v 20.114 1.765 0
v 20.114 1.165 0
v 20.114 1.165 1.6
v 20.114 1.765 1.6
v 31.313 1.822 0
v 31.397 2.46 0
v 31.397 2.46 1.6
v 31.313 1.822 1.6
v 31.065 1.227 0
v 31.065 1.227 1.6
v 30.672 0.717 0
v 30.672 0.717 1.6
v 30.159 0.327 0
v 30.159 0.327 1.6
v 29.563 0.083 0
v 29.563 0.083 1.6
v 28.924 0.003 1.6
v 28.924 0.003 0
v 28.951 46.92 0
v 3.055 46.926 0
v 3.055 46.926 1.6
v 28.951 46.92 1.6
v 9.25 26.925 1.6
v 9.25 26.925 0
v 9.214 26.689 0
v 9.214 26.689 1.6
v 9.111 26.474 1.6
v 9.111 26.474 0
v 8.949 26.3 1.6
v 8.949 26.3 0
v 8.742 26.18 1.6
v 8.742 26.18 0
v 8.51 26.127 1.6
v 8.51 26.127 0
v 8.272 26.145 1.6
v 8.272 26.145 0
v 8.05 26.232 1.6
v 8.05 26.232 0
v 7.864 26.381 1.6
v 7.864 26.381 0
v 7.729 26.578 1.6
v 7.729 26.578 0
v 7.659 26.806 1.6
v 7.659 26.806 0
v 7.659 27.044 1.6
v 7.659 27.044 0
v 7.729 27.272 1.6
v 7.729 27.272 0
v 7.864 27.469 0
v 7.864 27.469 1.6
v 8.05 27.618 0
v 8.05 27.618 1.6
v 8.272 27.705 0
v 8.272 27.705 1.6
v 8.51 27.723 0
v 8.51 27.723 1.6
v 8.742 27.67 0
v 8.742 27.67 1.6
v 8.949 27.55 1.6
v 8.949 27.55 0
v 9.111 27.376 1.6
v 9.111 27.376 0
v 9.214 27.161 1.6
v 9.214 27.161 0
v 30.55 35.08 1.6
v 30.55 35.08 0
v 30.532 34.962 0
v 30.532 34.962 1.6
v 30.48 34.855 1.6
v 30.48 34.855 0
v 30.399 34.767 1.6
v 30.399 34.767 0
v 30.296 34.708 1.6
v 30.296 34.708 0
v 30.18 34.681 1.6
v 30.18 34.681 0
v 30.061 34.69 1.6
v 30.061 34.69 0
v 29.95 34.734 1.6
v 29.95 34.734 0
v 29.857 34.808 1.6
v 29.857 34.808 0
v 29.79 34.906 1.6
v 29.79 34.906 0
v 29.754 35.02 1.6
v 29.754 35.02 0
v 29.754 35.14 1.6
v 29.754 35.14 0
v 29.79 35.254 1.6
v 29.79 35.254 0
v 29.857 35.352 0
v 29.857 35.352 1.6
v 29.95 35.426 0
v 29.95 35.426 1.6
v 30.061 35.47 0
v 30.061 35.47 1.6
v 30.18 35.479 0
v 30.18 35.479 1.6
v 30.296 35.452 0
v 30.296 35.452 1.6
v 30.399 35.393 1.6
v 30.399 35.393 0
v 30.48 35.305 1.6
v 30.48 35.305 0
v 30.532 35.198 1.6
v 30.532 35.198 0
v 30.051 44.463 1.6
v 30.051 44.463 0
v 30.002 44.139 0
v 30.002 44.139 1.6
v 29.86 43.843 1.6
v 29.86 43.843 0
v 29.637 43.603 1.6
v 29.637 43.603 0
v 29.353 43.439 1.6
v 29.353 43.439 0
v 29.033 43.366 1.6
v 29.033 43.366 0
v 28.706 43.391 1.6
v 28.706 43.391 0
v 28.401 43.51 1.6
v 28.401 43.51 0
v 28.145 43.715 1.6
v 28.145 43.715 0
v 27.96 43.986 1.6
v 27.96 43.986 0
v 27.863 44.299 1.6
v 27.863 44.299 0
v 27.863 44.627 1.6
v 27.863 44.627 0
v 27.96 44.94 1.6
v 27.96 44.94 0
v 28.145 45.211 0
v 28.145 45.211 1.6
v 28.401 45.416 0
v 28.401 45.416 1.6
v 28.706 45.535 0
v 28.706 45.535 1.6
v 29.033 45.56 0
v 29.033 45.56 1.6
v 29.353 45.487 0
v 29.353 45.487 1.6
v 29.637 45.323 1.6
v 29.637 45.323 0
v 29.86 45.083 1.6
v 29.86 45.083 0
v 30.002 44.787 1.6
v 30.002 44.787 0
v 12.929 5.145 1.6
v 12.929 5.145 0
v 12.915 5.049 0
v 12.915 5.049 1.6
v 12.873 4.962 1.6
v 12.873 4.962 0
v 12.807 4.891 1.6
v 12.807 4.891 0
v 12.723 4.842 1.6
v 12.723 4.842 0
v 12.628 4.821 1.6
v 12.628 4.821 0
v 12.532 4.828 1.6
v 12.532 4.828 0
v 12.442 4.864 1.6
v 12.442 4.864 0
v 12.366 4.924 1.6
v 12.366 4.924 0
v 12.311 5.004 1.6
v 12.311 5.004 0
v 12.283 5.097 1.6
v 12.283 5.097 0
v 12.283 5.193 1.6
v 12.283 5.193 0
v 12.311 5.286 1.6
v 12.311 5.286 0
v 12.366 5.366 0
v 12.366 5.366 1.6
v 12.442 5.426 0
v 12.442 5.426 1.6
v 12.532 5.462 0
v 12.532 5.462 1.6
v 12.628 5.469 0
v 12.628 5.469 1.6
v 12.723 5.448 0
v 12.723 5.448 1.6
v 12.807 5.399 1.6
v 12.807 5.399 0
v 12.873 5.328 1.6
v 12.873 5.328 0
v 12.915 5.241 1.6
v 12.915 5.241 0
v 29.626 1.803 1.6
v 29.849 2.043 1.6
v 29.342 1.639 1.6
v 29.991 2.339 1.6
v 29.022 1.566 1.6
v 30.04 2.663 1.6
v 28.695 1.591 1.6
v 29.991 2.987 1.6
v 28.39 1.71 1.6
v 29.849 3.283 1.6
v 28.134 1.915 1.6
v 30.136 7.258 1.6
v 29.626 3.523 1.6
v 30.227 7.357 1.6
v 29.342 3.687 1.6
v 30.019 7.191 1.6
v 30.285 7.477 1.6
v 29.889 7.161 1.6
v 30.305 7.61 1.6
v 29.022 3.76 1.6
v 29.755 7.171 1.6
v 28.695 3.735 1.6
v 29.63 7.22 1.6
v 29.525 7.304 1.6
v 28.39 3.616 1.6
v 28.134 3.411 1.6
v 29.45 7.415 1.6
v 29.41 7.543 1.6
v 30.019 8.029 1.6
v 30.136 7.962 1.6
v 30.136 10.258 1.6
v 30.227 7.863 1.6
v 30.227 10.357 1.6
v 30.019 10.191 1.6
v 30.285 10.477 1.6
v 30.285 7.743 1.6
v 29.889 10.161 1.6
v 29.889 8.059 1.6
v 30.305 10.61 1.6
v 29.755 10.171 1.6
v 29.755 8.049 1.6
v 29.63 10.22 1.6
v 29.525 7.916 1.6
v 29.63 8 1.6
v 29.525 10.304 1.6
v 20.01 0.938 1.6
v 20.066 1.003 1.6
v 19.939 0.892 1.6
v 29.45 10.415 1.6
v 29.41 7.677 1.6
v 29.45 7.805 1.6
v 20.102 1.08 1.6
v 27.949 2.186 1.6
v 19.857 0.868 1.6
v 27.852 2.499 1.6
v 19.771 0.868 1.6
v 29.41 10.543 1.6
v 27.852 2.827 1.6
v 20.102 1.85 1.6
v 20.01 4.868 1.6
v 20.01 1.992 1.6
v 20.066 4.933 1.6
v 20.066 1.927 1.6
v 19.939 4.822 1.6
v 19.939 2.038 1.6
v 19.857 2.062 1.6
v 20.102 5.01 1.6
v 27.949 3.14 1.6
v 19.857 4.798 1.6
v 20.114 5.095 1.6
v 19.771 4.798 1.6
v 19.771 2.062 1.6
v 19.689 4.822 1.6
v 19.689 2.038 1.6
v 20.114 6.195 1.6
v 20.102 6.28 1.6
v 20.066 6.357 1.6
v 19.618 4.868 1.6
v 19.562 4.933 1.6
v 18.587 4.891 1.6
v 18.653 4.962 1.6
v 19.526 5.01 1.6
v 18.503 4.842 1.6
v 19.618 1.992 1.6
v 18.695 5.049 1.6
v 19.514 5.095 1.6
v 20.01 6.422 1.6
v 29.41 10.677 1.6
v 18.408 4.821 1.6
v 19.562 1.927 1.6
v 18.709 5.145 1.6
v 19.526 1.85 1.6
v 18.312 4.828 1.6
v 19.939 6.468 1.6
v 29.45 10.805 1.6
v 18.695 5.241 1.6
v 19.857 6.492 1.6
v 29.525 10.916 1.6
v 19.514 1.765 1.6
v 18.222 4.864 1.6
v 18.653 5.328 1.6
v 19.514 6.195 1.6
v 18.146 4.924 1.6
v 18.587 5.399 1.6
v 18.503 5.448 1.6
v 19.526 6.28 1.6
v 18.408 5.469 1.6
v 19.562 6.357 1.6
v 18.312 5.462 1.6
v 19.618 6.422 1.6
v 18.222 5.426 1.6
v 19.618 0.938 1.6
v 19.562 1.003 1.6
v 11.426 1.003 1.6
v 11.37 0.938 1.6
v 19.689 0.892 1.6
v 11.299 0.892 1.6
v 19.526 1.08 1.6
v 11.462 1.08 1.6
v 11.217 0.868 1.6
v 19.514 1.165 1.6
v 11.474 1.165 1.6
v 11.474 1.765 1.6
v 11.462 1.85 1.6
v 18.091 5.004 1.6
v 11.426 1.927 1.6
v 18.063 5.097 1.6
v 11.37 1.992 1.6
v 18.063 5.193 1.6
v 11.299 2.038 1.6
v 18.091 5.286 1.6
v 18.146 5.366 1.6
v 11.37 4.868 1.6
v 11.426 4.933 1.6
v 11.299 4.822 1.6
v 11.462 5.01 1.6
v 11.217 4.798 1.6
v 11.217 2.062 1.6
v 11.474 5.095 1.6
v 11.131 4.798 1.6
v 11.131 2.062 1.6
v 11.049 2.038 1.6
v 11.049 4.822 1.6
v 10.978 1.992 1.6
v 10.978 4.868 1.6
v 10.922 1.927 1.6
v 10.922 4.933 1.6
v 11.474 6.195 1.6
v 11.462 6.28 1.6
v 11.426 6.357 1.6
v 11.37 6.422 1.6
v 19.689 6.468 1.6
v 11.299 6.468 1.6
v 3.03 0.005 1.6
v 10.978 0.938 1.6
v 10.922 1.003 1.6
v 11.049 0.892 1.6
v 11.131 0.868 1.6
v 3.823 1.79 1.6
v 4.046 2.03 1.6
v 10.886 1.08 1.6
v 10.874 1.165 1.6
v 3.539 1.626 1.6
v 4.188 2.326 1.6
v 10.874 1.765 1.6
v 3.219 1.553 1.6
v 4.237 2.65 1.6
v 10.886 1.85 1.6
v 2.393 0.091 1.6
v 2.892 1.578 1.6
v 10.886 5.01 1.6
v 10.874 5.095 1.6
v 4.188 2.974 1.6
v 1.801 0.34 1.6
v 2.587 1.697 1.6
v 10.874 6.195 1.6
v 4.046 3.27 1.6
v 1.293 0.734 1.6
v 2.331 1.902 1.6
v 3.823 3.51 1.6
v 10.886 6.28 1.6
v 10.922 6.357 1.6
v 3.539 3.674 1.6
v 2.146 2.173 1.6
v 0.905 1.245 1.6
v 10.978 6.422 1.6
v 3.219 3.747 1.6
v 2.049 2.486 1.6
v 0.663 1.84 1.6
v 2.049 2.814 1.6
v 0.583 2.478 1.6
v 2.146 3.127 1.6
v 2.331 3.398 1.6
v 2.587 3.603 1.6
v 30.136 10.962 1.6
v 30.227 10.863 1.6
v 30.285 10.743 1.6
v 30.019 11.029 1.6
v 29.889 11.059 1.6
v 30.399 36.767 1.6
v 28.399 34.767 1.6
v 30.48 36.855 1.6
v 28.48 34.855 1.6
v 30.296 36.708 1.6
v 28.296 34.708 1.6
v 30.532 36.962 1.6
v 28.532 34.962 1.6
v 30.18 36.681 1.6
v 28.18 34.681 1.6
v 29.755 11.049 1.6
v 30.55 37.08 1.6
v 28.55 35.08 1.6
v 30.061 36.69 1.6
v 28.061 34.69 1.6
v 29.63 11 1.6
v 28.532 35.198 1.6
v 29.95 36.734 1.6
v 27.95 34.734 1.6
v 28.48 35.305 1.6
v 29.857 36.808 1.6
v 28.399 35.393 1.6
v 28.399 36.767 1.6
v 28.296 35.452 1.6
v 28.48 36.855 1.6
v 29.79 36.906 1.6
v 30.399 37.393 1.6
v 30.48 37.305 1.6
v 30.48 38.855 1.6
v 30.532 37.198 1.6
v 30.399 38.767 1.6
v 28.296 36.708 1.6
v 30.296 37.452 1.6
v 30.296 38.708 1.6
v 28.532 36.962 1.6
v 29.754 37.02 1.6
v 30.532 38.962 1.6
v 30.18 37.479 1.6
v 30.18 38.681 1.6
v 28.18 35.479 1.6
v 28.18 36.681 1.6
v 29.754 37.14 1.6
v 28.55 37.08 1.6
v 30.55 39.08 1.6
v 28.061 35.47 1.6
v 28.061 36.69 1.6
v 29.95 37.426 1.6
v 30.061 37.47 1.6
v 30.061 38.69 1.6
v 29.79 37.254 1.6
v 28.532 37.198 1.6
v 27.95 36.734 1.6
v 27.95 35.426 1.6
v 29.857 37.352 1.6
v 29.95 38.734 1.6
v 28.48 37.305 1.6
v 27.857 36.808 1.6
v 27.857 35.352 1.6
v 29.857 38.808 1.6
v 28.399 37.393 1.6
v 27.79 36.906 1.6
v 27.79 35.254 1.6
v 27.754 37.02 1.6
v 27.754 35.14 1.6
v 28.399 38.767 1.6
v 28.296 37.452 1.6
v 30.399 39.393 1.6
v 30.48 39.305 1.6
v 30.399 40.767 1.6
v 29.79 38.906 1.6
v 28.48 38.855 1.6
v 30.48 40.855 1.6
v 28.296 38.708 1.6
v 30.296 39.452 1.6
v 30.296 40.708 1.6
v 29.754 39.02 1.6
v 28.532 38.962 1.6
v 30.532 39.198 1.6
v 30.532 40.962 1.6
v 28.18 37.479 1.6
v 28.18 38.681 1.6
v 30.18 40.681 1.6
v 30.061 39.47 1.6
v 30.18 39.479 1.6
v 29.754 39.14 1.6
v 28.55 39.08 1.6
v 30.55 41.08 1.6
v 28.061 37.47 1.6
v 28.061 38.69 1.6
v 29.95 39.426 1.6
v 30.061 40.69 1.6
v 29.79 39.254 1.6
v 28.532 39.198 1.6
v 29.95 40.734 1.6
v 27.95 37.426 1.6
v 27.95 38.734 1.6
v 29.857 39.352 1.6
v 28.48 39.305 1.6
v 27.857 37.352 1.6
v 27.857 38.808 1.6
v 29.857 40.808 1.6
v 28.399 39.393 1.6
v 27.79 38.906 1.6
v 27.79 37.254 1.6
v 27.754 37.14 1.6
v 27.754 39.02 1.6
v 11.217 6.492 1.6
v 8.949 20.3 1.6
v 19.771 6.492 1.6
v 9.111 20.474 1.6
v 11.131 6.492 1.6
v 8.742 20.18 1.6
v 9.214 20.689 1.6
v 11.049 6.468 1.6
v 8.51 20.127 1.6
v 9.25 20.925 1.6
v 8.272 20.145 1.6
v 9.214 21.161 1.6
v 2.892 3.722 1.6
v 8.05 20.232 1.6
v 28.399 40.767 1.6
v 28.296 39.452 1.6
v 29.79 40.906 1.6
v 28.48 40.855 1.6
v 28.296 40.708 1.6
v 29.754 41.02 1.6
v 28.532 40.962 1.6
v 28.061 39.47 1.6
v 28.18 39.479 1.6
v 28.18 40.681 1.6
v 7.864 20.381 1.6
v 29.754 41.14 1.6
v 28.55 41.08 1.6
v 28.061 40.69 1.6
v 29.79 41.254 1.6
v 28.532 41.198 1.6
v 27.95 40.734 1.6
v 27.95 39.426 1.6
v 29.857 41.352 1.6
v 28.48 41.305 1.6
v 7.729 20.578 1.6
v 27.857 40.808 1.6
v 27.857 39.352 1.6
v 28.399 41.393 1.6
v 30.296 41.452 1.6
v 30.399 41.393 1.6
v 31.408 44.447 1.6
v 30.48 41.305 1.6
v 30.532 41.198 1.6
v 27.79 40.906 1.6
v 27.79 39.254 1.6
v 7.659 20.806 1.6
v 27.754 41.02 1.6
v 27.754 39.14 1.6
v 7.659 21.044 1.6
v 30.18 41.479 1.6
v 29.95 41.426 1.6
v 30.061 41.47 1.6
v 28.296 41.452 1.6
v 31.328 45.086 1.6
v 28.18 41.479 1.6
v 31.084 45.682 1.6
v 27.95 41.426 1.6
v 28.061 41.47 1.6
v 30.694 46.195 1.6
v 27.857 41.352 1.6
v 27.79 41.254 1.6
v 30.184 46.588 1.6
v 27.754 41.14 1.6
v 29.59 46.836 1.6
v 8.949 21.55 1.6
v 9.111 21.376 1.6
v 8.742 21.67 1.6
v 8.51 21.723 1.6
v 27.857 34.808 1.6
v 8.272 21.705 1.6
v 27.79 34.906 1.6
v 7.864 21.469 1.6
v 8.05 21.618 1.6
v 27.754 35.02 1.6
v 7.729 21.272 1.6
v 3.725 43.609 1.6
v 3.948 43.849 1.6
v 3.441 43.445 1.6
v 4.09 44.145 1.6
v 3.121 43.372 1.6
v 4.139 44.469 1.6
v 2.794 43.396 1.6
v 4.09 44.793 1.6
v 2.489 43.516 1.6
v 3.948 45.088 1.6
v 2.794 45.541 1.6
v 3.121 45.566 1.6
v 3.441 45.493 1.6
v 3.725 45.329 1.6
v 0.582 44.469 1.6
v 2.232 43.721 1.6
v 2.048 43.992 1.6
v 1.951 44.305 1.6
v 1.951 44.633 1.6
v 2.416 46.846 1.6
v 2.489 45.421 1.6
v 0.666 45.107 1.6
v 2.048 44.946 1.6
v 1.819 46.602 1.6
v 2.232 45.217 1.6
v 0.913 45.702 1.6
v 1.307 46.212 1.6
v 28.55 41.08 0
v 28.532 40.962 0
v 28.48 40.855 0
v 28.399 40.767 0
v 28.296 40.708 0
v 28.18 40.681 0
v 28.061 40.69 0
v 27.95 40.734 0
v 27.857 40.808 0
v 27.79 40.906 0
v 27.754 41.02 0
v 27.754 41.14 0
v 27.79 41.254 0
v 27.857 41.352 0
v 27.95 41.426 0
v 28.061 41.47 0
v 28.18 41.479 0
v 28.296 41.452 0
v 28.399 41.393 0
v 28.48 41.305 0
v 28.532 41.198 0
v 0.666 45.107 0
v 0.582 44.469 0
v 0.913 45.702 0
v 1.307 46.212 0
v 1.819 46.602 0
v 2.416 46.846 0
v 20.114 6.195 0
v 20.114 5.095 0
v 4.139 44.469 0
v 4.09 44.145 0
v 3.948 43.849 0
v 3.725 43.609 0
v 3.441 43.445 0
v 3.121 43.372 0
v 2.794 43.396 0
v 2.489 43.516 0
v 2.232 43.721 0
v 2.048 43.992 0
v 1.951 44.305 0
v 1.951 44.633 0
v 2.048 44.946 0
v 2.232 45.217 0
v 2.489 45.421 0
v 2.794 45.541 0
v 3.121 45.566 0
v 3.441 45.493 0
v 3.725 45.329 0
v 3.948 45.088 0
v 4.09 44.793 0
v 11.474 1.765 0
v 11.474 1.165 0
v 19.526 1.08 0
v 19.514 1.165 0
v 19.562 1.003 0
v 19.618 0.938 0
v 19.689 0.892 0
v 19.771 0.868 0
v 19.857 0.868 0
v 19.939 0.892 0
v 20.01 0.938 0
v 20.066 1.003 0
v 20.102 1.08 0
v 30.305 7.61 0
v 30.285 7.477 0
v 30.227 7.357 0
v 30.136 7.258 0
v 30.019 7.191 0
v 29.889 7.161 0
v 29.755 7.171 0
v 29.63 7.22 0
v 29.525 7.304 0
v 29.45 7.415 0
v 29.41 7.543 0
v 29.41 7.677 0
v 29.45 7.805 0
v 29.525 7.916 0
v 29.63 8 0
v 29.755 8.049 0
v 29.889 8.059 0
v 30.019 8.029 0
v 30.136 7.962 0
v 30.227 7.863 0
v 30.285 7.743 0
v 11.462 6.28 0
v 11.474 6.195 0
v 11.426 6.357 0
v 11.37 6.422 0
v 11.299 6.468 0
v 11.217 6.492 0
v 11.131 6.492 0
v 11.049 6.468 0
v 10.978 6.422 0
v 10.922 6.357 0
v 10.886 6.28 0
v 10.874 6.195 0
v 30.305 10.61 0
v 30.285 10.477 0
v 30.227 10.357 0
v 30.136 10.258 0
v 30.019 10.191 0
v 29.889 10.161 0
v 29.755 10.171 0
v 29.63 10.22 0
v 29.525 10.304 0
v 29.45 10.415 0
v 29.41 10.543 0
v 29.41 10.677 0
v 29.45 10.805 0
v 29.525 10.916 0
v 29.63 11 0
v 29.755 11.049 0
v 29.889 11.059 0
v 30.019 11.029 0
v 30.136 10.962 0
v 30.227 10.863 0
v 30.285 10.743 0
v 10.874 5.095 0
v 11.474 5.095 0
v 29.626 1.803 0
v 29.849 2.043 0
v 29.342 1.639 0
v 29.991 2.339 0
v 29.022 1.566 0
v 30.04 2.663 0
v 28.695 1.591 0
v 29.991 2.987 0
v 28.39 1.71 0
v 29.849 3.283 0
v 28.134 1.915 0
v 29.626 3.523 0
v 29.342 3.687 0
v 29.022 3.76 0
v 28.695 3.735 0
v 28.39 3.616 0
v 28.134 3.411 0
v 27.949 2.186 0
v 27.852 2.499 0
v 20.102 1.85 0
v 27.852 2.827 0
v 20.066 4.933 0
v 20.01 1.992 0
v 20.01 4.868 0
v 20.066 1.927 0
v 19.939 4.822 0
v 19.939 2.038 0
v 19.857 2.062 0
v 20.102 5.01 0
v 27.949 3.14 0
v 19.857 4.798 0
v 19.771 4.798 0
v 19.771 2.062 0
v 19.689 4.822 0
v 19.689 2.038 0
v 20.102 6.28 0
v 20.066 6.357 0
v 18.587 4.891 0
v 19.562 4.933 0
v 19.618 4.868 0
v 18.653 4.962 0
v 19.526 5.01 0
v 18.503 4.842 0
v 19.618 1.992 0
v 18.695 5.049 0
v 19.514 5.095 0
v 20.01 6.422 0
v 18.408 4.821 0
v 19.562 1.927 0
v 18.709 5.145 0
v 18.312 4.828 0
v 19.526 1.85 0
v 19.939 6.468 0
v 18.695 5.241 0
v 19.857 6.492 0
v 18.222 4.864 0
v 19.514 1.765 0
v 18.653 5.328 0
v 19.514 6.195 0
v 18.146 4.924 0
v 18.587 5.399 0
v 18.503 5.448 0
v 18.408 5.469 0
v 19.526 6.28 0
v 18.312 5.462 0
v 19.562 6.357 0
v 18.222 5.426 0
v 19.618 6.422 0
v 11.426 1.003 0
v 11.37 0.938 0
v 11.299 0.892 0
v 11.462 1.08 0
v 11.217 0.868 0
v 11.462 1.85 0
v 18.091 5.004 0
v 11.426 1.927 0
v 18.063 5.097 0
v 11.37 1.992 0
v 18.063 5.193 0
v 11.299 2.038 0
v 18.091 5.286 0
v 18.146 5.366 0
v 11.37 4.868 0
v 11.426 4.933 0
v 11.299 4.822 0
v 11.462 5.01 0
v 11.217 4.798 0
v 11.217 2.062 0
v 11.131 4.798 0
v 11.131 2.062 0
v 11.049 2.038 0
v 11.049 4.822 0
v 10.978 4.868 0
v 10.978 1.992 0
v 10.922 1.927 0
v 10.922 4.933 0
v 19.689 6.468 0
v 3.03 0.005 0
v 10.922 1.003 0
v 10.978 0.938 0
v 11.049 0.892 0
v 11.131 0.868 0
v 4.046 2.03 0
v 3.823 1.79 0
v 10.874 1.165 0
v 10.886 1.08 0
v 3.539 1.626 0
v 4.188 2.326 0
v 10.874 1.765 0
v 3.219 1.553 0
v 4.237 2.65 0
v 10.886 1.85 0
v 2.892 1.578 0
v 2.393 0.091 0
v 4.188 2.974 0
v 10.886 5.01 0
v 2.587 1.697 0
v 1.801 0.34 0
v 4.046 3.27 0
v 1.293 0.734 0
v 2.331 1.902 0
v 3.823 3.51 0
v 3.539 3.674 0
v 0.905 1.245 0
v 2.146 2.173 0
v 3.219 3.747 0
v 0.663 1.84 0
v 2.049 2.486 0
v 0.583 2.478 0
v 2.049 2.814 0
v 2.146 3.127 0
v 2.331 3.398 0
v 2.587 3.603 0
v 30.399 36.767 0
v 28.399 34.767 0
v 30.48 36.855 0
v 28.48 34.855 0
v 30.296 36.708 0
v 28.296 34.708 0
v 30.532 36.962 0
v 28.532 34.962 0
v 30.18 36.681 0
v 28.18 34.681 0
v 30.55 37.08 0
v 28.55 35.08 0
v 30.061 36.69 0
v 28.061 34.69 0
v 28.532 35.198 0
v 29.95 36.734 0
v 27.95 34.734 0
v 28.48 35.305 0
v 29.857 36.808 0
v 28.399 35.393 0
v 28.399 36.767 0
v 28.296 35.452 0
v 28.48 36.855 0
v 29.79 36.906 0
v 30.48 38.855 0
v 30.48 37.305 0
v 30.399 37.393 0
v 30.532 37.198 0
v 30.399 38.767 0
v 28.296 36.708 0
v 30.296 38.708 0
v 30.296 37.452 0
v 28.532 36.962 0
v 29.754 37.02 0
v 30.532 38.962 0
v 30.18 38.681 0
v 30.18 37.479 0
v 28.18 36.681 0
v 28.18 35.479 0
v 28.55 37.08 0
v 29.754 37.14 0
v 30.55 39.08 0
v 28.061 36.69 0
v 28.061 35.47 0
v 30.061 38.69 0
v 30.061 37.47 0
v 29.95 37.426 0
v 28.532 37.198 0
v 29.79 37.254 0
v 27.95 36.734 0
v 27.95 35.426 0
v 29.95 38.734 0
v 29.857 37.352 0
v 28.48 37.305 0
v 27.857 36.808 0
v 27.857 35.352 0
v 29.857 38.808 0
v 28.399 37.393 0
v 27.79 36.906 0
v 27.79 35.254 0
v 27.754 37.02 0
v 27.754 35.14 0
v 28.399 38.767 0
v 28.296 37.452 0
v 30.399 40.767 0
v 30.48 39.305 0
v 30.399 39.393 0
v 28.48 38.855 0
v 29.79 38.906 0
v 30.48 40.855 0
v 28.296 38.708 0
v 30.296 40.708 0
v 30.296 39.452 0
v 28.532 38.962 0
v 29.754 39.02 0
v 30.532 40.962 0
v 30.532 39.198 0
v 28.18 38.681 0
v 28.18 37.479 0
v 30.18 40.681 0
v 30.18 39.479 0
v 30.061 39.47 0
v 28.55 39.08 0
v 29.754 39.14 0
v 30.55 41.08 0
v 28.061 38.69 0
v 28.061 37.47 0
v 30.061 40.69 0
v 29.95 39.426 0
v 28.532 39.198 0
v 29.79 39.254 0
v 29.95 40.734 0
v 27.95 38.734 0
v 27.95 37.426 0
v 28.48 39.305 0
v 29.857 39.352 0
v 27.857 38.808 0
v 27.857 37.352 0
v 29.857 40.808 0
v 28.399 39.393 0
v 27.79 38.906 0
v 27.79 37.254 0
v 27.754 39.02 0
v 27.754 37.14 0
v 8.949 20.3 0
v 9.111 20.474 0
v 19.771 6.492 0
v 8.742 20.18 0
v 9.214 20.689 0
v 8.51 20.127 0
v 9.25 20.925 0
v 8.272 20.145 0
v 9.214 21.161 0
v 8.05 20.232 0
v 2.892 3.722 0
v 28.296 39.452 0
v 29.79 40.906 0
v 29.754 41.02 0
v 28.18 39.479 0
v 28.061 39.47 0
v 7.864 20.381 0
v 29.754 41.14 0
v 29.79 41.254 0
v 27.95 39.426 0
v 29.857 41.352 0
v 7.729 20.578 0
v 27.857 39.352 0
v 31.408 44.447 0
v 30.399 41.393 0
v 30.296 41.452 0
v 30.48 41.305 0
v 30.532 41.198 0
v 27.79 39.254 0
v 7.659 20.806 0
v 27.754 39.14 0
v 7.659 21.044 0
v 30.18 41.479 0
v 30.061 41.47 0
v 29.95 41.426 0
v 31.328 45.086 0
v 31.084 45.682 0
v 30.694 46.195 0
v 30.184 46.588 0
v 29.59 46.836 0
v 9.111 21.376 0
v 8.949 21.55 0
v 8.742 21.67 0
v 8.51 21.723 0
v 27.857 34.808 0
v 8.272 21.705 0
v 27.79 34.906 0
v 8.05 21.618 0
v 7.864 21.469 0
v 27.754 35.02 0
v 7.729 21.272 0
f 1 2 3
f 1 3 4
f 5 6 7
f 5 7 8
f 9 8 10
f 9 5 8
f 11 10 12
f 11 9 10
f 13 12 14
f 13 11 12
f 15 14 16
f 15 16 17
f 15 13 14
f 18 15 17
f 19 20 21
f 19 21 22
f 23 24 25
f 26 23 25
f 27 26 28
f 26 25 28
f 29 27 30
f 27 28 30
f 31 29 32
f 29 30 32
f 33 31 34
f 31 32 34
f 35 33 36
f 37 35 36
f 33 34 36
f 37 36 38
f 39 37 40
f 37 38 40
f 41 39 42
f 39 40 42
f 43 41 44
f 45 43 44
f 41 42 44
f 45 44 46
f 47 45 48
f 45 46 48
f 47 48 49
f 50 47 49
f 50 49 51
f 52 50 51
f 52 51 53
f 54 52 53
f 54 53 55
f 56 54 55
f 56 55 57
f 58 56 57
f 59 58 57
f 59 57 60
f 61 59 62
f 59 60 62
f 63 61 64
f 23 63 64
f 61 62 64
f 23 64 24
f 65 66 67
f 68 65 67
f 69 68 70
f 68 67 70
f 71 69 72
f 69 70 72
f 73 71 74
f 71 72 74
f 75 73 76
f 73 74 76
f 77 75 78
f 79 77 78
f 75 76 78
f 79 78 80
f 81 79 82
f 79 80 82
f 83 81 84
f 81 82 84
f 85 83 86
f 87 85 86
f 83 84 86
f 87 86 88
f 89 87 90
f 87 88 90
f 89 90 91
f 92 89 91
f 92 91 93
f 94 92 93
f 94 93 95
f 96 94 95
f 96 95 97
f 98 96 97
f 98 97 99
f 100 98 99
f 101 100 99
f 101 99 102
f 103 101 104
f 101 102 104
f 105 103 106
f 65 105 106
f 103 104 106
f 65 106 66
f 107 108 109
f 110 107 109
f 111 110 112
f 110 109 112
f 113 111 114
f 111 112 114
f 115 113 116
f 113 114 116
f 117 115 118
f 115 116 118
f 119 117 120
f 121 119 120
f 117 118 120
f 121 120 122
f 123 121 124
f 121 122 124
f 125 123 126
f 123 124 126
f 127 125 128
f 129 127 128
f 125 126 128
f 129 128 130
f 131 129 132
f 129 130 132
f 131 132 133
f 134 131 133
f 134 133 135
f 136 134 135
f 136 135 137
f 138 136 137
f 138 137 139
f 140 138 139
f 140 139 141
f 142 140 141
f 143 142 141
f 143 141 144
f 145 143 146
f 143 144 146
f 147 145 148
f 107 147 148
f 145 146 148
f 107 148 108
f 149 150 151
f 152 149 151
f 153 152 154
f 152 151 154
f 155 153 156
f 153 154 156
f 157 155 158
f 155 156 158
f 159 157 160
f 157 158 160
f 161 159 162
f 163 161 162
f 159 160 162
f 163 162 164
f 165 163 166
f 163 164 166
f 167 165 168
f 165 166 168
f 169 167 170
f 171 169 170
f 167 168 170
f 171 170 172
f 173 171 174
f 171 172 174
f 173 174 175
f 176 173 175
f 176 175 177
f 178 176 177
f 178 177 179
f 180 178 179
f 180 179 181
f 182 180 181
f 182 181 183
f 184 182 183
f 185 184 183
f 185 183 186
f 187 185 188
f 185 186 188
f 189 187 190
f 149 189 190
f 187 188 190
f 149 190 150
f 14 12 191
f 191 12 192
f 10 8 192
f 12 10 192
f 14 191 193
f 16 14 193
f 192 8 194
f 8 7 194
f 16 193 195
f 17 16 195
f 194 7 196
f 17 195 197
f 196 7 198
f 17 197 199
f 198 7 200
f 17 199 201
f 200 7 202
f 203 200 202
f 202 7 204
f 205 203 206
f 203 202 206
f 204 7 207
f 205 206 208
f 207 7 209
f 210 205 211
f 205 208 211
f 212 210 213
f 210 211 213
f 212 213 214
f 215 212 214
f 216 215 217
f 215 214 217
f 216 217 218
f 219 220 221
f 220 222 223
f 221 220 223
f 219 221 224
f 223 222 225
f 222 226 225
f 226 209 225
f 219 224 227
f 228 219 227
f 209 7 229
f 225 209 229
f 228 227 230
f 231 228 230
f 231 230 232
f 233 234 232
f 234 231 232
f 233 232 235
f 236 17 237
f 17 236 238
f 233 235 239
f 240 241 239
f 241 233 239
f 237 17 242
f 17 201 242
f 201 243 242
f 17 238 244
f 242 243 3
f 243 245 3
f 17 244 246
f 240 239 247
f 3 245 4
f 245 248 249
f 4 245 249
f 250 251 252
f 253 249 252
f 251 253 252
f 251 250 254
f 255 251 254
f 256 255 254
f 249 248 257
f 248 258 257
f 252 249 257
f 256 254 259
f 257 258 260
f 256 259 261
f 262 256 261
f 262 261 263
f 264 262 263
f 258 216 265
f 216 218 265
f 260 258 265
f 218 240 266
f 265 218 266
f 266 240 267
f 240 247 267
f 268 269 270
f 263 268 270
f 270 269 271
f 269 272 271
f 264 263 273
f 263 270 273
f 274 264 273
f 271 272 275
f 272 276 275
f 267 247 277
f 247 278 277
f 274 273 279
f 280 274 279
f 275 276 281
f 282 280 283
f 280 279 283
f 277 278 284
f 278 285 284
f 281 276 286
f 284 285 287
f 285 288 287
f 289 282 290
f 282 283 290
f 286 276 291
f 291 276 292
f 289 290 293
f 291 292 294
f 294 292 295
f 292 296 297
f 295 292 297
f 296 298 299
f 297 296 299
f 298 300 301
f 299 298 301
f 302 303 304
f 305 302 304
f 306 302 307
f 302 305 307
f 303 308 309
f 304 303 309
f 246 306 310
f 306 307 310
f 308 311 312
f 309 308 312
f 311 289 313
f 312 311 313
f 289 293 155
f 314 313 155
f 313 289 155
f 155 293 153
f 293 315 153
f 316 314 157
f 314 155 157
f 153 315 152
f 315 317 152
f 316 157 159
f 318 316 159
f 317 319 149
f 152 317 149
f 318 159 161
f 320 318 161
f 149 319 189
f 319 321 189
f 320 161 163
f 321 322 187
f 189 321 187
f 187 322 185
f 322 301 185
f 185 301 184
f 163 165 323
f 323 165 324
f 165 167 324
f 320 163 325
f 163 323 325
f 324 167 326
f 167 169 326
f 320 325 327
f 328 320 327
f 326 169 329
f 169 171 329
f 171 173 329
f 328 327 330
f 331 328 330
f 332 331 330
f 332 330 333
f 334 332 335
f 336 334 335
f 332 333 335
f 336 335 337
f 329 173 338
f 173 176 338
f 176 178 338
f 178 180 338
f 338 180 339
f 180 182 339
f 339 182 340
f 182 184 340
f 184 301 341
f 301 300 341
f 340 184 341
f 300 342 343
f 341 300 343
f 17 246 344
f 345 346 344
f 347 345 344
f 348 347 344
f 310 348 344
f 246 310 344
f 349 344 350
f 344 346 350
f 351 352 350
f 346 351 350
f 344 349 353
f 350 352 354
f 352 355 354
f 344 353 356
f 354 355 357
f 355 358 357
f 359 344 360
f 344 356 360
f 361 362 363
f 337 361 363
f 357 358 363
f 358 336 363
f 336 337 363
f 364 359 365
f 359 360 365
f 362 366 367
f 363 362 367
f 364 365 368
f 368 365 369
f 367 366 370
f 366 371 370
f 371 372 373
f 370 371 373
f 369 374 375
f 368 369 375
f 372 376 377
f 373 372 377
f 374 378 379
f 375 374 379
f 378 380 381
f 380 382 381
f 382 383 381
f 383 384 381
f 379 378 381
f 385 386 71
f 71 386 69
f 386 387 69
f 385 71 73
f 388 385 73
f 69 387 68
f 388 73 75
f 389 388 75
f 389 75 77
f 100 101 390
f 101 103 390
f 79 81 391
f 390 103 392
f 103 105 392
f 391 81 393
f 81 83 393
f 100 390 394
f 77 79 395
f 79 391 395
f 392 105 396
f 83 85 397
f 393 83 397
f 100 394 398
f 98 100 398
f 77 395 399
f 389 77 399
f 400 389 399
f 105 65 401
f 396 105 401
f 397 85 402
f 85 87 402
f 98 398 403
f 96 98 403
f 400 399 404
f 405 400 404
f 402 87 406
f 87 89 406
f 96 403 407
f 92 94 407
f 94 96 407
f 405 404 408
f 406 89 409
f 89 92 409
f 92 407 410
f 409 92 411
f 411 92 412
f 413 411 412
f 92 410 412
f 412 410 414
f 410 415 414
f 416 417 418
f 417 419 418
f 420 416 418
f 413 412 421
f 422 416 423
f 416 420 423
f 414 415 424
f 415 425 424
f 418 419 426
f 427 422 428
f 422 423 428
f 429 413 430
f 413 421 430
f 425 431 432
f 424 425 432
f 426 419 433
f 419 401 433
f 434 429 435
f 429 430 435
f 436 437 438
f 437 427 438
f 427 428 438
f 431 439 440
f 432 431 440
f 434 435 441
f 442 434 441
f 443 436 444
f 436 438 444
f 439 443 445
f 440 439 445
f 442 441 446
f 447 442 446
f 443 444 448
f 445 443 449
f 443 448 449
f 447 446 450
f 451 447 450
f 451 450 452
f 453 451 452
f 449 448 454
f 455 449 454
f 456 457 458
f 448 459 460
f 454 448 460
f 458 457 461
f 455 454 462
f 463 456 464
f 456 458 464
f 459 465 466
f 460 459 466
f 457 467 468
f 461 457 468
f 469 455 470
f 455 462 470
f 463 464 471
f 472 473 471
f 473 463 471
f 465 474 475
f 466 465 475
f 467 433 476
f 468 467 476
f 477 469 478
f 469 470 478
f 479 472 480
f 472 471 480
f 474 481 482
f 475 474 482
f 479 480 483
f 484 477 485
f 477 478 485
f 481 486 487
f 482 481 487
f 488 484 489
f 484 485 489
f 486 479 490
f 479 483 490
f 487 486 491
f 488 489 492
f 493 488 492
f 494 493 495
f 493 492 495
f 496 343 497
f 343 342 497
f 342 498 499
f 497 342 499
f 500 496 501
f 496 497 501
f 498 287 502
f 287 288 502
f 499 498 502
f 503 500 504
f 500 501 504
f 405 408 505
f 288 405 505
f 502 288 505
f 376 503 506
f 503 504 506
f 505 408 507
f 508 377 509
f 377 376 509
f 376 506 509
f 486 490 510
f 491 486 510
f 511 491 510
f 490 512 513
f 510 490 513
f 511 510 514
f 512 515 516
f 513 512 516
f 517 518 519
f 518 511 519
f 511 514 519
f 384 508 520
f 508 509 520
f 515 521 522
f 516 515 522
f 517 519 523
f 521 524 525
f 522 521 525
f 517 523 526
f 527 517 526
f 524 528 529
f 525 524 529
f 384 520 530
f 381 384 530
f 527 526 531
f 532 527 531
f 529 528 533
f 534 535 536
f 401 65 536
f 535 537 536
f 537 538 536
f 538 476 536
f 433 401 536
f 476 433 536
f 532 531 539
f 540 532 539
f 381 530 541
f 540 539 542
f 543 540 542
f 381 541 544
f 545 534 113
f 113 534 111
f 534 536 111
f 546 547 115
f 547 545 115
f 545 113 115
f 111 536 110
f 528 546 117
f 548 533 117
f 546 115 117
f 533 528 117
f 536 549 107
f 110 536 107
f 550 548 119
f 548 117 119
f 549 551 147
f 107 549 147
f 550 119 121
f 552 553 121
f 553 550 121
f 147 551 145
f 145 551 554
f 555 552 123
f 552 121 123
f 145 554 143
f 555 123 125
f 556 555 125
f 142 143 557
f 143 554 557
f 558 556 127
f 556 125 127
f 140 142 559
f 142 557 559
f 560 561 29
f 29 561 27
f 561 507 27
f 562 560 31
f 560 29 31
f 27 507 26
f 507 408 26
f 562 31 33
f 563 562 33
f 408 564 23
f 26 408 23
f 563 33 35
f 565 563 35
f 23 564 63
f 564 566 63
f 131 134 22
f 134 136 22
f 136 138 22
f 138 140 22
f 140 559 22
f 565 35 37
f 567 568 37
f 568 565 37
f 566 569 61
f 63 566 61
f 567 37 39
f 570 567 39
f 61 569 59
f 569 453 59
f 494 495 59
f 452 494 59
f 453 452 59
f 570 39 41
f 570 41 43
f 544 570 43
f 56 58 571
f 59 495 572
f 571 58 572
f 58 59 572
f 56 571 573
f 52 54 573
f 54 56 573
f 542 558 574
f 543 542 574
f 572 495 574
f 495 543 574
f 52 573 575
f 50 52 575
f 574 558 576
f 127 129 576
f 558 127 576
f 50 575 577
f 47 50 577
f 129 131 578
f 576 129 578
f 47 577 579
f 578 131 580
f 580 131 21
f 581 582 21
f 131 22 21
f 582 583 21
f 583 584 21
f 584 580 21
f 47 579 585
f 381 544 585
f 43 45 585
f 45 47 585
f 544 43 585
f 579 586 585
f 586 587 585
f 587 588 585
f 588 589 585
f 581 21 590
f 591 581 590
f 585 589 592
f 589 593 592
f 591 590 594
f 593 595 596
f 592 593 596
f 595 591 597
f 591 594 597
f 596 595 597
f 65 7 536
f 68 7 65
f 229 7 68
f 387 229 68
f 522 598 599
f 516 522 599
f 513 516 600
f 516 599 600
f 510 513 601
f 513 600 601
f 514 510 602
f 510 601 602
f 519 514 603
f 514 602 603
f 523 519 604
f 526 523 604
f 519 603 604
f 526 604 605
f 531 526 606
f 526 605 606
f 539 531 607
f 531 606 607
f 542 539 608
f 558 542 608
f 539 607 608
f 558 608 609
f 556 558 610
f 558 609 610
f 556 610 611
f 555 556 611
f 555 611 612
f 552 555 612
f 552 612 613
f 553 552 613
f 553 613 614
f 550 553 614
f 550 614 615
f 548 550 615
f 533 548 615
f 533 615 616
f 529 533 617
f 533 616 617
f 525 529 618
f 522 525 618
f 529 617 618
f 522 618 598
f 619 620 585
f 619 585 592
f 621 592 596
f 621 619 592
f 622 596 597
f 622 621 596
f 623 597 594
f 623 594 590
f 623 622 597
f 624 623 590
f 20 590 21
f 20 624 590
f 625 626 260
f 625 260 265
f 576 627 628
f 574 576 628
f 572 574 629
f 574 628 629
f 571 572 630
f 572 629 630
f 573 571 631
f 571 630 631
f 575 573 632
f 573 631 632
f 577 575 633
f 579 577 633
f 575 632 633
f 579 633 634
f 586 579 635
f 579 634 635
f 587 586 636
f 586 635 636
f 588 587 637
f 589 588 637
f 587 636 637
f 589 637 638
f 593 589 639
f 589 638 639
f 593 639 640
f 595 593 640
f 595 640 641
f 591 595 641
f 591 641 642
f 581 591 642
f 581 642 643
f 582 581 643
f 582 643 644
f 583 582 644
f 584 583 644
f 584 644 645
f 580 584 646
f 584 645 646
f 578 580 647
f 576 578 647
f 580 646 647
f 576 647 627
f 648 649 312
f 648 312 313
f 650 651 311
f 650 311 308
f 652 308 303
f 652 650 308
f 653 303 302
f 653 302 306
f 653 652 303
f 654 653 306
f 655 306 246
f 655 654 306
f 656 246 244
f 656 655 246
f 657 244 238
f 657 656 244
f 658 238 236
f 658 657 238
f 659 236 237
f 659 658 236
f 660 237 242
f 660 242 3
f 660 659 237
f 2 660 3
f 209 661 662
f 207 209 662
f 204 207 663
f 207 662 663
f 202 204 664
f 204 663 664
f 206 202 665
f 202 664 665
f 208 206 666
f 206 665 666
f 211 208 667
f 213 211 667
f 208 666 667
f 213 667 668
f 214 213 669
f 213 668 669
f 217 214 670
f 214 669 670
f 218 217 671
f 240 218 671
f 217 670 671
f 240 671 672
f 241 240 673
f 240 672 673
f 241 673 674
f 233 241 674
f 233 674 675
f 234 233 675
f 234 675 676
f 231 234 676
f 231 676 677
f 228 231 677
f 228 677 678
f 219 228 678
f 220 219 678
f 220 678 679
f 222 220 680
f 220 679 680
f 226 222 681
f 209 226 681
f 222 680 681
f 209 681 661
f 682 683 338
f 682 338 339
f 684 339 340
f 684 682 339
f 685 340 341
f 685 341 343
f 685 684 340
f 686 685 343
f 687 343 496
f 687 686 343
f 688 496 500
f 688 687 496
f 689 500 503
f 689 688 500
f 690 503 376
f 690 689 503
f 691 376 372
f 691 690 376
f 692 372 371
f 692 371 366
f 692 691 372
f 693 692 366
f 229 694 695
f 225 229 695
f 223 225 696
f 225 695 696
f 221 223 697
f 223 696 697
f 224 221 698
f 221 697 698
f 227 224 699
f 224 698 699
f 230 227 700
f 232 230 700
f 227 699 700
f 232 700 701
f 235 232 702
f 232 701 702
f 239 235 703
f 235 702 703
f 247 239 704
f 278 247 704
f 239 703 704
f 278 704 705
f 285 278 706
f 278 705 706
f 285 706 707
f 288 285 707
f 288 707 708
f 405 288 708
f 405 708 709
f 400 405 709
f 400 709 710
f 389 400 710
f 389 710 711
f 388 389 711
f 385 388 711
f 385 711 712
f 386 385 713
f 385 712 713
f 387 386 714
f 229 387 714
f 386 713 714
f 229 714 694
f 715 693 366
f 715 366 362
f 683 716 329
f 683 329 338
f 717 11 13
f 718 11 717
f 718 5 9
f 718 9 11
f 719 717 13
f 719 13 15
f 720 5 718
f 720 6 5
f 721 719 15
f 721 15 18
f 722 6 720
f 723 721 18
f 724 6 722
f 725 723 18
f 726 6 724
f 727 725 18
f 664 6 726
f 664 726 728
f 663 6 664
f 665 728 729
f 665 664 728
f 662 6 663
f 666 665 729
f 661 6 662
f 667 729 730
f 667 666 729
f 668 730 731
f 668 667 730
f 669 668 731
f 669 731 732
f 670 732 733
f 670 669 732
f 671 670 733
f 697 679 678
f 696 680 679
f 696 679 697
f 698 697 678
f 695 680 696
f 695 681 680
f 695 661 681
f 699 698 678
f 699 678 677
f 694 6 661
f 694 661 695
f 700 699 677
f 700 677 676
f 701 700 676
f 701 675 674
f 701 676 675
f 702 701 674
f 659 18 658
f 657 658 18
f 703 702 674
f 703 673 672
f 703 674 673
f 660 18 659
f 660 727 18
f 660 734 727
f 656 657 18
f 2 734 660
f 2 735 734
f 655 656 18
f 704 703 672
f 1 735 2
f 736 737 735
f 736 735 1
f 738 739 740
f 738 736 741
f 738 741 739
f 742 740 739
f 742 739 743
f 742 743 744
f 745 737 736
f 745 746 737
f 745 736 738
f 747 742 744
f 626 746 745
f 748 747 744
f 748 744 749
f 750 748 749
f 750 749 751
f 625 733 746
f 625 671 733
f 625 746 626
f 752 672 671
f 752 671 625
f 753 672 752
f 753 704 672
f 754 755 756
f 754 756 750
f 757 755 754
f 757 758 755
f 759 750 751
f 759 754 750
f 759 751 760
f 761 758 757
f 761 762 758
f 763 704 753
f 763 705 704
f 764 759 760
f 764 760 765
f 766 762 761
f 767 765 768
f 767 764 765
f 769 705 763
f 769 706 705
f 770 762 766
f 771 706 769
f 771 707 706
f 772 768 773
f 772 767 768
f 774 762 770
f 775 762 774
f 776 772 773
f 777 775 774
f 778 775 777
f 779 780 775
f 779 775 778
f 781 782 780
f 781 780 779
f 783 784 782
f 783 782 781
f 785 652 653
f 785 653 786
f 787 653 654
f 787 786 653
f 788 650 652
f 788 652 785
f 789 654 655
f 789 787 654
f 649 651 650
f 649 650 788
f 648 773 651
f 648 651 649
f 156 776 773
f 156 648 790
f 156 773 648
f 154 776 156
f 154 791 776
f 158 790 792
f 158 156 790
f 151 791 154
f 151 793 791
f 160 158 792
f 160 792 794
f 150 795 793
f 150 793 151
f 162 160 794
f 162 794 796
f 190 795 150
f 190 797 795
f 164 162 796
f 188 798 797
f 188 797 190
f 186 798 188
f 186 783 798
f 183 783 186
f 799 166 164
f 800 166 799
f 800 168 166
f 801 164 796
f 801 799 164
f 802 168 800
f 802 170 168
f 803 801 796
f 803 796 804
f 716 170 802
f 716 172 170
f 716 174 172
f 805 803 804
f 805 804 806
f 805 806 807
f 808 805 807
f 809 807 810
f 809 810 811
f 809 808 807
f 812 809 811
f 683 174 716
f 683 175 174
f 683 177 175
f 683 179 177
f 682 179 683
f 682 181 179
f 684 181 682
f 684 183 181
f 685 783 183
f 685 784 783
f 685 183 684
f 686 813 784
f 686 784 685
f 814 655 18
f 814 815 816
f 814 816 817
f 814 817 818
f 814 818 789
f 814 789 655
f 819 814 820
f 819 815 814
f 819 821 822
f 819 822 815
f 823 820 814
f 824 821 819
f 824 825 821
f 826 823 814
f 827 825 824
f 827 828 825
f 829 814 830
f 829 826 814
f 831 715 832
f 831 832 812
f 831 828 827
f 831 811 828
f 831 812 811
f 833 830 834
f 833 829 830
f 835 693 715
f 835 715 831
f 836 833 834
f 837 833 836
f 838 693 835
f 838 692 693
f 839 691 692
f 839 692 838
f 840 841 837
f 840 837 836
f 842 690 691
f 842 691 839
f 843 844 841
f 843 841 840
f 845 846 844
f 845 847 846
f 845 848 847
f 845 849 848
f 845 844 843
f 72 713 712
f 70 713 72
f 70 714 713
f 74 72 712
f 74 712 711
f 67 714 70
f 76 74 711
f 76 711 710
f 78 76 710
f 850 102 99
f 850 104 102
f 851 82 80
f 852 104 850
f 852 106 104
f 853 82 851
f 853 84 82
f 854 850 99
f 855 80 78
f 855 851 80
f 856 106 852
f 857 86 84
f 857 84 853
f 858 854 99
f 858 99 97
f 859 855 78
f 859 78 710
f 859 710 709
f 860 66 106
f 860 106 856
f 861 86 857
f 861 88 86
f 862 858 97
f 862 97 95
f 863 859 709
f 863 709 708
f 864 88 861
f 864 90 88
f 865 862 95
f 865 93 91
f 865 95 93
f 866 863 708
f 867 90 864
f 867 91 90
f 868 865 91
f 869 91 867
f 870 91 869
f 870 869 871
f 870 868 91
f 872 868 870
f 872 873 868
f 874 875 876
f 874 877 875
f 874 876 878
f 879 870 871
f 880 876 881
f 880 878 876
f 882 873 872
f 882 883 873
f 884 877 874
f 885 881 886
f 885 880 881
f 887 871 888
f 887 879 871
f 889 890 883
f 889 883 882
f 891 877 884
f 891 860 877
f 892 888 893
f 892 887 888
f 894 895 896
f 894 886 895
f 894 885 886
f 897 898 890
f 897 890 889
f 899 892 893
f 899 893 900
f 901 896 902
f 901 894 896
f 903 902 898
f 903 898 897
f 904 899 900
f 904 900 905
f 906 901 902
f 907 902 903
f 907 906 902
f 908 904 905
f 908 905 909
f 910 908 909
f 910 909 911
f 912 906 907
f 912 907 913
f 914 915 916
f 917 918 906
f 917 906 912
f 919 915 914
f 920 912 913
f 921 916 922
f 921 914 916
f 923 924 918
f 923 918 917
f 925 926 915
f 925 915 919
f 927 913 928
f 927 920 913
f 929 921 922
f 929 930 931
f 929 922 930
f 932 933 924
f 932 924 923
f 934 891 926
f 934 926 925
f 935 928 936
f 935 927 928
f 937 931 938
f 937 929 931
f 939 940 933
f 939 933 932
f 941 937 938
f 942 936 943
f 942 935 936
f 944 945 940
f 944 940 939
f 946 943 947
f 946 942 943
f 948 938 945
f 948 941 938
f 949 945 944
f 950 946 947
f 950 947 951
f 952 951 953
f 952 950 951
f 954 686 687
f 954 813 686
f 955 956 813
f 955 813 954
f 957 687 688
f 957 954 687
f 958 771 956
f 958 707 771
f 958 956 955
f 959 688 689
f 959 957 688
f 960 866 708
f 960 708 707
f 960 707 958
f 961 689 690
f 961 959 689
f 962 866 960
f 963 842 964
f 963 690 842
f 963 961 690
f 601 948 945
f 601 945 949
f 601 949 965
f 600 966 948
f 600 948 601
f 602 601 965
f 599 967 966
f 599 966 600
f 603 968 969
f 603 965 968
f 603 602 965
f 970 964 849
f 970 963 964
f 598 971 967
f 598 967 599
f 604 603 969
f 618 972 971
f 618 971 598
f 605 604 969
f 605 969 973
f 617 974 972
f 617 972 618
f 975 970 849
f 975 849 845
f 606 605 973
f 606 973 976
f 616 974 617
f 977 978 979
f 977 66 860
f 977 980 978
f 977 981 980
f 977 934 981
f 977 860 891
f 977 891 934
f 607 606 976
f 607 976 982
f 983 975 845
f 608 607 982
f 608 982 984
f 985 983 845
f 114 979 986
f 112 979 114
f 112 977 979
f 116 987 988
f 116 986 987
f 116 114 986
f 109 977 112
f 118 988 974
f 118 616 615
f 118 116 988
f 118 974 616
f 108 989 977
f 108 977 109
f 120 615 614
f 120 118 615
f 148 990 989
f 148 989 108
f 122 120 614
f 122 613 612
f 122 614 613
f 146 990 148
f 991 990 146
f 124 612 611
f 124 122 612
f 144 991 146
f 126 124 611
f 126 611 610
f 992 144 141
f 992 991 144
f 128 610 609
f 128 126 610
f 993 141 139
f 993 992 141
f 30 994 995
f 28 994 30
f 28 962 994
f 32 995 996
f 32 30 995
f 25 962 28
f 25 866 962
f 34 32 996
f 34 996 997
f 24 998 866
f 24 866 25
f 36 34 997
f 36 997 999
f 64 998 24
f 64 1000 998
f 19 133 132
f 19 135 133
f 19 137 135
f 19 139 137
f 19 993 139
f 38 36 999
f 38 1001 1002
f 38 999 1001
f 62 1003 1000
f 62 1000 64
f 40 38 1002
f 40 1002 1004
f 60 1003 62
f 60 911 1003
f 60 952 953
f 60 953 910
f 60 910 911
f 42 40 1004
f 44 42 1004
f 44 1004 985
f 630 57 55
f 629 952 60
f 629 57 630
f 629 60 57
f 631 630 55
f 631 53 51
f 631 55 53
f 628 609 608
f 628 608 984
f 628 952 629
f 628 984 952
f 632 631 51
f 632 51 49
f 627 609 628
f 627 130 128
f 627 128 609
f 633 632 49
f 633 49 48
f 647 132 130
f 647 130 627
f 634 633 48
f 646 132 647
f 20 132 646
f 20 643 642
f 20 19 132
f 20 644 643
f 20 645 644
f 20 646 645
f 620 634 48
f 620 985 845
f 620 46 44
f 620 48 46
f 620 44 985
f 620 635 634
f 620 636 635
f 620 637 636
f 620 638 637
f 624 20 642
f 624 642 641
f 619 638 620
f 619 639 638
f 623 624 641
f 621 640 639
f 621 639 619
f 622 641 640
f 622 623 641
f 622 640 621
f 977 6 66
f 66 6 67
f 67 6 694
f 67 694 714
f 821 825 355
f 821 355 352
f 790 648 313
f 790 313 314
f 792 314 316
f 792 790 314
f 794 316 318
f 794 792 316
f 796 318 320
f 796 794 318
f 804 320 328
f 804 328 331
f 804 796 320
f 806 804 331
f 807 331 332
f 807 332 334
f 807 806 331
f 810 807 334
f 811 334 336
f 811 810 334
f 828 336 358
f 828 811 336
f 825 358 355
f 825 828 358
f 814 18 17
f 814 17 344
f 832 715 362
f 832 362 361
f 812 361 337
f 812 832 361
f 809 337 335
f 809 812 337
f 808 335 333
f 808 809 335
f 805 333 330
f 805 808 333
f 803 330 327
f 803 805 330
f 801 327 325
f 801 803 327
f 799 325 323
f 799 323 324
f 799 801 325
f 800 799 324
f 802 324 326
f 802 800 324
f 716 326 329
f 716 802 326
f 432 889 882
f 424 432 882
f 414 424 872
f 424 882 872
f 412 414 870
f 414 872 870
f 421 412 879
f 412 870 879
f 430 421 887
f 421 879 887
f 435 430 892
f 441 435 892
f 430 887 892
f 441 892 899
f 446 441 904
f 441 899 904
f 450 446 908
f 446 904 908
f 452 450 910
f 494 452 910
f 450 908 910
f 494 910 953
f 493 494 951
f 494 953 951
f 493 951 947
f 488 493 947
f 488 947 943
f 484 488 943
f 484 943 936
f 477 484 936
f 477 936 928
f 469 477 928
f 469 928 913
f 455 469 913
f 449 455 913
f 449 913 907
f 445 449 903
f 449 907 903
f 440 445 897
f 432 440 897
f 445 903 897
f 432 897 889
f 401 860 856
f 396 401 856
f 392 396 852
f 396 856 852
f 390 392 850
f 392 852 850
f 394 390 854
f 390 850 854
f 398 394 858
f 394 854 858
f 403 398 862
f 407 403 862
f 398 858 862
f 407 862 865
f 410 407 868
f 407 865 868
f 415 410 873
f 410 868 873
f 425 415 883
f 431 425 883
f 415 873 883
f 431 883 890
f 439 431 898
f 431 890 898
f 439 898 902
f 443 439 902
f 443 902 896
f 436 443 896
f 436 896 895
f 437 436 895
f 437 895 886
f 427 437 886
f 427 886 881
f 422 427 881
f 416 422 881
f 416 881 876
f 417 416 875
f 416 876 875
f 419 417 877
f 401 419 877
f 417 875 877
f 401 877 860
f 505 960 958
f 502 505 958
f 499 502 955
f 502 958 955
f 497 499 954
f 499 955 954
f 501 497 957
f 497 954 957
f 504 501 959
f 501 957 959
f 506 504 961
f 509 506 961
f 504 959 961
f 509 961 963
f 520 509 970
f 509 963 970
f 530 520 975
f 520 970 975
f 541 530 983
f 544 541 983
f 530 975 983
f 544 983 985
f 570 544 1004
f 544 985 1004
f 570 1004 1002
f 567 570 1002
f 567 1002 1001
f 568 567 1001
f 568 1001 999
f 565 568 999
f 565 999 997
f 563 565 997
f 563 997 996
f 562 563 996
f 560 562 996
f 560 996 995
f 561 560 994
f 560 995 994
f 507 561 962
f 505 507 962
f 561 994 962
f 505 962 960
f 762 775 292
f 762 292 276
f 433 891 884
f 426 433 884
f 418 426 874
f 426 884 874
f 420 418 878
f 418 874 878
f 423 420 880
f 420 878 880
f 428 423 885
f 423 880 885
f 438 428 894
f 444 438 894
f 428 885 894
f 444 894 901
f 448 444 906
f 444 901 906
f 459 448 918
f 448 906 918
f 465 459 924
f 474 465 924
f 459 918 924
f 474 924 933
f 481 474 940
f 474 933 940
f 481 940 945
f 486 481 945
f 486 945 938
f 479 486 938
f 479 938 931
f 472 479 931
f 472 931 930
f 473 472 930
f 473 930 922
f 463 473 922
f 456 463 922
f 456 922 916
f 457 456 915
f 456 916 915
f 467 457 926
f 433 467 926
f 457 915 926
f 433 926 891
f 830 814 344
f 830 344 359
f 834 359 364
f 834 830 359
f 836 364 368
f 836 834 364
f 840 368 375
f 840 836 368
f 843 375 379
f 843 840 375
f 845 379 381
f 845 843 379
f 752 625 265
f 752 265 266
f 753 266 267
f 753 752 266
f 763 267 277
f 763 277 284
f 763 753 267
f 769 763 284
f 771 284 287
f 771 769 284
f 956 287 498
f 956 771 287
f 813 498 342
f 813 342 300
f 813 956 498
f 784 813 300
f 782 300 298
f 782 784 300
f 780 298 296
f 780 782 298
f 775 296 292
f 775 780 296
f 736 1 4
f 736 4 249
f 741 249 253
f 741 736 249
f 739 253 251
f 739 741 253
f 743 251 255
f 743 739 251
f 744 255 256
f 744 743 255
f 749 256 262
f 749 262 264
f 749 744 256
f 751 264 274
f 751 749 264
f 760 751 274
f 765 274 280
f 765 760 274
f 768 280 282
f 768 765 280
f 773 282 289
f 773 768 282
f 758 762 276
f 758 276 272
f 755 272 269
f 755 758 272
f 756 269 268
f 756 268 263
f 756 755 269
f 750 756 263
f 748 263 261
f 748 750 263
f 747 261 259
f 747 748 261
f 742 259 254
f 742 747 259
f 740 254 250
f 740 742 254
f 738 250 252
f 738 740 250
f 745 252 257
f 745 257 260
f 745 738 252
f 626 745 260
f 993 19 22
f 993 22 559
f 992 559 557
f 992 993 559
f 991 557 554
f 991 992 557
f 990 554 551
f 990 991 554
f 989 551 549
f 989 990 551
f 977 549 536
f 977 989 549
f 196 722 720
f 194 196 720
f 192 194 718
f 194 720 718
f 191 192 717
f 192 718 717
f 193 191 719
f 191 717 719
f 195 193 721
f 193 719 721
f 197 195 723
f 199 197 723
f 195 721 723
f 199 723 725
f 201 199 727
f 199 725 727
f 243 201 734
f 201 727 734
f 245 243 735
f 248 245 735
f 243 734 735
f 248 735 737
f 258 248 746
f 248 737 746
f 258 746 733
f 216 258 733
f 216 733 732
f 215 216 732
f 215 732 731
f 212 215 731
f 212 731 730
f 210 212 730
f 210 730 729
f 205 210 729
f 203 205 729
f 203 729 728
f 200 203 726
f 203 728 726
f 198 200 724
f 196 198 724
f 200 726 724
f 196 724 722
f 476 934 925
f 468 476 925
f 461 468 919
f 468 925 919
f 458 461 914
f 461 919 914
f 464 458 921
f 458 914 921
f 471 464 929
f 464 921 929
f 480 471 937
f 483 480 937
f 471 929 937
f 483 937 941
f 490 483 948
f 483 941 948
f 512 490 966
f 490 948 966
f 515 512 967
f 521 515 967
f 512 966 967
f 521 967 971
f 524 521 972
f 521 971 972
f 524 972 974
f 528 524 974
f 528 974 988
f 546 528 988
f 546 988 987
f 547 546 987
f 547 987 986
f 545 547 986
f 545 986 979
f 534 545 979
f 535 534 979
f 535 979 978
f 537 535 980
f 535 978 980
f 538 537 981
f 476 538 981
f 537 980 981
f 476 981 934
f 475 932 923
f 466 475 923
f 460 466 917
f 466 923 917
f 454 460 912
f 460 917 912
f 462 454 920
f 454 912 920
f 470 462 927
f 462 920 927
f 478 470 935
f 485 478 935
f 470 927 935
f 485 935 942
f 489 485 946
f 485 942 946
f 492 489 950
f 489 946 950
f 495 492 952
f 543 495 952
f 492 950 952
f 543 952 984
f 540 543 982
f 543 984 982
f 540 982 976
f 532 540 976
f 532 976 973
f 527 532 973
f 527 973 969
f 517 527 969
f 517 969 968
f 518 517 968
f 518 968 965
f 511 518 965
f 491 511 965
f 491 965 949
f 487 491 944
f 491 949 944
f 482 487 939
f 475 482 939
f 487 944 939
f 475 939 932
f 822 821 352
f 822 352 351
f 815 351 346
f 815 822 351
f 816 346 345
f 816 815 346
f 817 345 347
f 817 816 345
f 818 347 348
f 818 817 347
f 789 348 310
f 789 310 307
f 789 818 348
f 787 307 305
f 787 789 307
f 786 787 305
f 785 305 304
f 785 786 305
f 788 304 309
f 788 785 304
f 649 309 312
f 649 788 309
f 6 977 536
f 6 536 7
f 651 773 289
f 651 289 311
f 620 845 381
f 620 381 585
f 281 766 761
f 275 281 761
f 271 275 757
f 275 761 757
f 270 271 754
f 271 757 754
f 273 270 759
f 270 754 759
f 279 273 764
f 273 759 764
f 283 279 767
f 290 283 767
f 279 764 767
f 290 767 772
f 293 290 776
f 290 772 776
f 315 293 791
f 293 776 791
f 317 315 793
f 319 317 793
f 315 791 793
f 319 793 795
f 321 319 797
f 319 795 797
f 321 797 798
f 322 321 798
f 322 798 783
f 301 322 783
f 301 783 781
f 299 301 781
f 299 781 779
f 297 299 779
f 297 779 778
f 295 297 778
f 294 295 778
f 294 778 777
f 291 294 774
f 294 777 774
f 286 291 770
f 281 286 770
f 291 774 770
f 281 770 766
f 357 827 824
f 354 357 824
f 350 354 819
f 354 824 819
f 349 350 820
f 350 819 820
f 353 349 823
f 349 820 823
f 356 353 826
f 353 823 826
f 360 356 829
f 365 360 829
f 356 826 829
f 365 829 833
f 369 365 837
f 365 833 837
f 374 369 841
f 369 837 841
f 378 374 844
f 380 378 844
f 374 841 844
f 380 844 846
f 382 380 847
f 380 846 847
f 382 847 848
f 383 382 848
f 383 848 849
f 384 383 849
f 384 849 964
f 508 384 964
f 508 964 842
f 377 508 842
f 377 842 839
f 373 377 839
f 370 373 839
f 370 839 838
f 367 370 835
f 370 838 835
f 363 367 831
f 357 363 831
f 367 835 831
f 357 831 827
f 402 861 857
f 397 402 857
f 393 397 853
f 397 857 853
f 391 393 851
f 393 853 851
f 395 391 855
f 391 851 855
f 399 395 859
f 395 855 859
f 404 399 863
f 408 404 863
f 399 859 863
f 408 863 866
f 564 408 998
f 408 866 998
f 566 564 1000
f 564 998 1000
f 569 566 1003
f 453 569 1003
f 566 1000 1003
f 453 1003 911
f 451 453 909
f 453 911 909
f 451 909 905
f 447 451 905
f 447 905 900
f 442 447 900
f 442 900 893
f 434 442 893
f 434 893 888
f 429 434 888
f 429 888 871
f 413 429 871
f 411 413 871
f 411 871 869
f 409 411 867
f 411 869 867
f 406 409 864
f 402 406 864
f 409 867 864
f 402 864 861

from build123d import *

# Parameters (mm, degrees)
SKETCH_1_R      = 1.1
SKETCH_1_R_2    = 0.45
SKETCH_1_R_3    = 0.325
SKETCH_1_R_4    = 0.8
SKETCH_1_R_5    = 0.4
SKETCH_1_R_6    = 1.099998
EXTRUDE_1_DEPTH = 1.6


with BuildPart() as part:
    # 草图1 → 凸台-拉伸1 (new body)
    with BuildSketch(Plane(origin=(0, 0, 0), x_dir=(-1, 0, 0), z_dir=(0, 0, -1))):
        with BuildLine():
            Line((-28.92416249, 0.002948493), (-3.030002484, 0.0047195))
            ThreePointArc((-3.030002484, 0.0047195), (-1.293435555, 0.73352407), (-0.582919351, 2.477653515))
            Line((-0.582919351, 2.477653515), (-0.581684294, 44.468735287))
            ThreePointArc((-0.581684294, 44.468735287), (-1.306942661, 46.21181505), (-3.054644493, 46.925863413))
            Line((-3.054644493, 46.925863413), (-28.9511375, 46.920055471))
            ThreePointArc((-28.9511375, 46.920055471), (-30.694165746, 46.194778446), (-31.408188877, 44.447109943))
            Line((-31.408188877, 44.447109943), (-31.397105, 2.460002))
            ThreePointArc((-31.397105, 2.460002), (-30.671824776, 0.716978502), (-28.92416249, 0.002948493))
        make_face()
        with Locations(Location((-28.94, 2.662946, 0), (0, 0, 180))):
            Circle(SKETCH_1_R, mode=Mode.SUBTRACT)
        with Locations(Location((-29.855, 7.61, 0), (0, 0, 180))):
            Circle(SKETCH_1_R_2, mode=Mode.SUBTRACT)
        with Locations(Location((-29.855, 10.61, 0), (0, 0, 180))):
            Circle(SKETCH_1_R_2, mode=Mode.SUBTRACT)
        with Locations(Location((-18.384, 5.145, 0), (0, 0, 180))):
            Circle(SKETCH_1_R_3, mode=Mode.SUBTRACT)
        with Locations(Location((-12.604, 5.145, 0), (0, 0, 180))):
            Circle(SKETCH_1_R_3, mode=Mode.SUBTRACT)
        with Locations(Location((-3.136974, 2.65, 0), (0, 0, 180))):
            Circle(SKETCH_1_R, mode=Mode.SUBTRACT)
        with Locations(Location((-8.45, 20.925, 0), (0, 0, 180))):
            Circle(SKETCH_1_R_4, mode=Mode.SUBTRACT)
        with Locations(Location((-30.15, 35.08, 0), (0, 0, 180))):
            Circle(SKETCH_1_R_5, mode=Mode.SUBTRACT)
        with Locations(Location((-30.15, 37.08, 0), (0, 0, 180))):
            Circle(SKETCH_1_R_5, mode=Mode.SUBTRACT)
        with Locations(Location((-28.15, 35.08, 0), (0, 0, 180))):
            Circle(SKETCH_1_R_5, mode=Mode.SUBTRACT)
        with Locations(Location((-28.15, 37.08, 0), (0, 0, 180))):
            Circle(SKETCH_1_R_5, mode=Mode.SUBTRACT)
        with Locations(Location((-30.15, 39.08, 0), (0, 0, 180))):
            Circle(SKETCH_1_R_5, mode=Mode.SUBTRACT)
        with Locations(Location((-28.15, 39.08, 0), (0, 0, 180))):
            Circle(SKETCH_1_R_5, mode=Mode.SUBTRACT)
        with Locations(Location((-30.15, 41.08, 0), (0, 0, 180))):
            Circle(SKETCH_1_R_5, mode=Mode.SUBTRACT)
        with Locations(Location((-28.15, 41.08, 0), (0, 0, 180))):
            Circle(SKETCH_1_R_5, mode=Mode.SUBTRACT)
        with Locations(Location((-28.951135, 44.462946, 0), (0, 0, 180))):
            Circle(SKETCH_1_R, mode=Mode.SUBTRACT)
        with Locations(Location((-8.45, 26.925, 0), (0, 0, 180))):
            Circle(SKETCH_1_R_4, mode=Mode.SUBTRACT)
        with Locations(Location((-3.038791293, 44.468807556, 0), (0, 0, 180))):
            Circle(SKETCH_1_R_6, mode=Mode.SUBTRACT)
        with BuildLine():
            Line((-19.514, 1.765), (-19.514, 1.165))
            ThreePointArc((-19.514, 1.165), (-19.814, 0.865), (-20.114, 1.165))
            Line((-20.114, 1.165), (-20.114, 1.765))
            ThreePointArc((-20.114, 1.765), (-19.814, 2.065), (-19.514, 1.765))
        make_face(mode=Mode.SUBTRACT)
        with BuildLine():
            Line((-19.514, 6.195), (-19.514, 5.095))
            ThreePointArc((-19.514, 5.095), (-19.814, 4.795), (-20.114, 5.095))
            Line((-20.114, 5.095), (-20.114, 6.195))
            ThreePointArc((-20.114, 6.195), (-19.814, 6.495), (-19.514, 6.195))
        make_face(mode=Mode.SUBTRACT)
        with BuildLine():
            Line((-10.874, 1.765), (-10.874, 1.165))
            ThreePointArc((-10.874, 1.165), (-11.174, 0.865), (-11.474, 1.165))
            Line((-11.474, 1.165), (-11.474, 1.765))
            ThreePointArc((-11.474, 1.765), (-11.174, 2.065), (-10.874, 1.765))
        make_face(mode=Mode.SUBTRACT)
        with BuildLine():
            Line((-10.874, 6.195), (-10.874, 5.095))
            ThreePointArc((-10.874, 5.095), (-11.174, 4.795), (-11.474, 5.095))
            Line((-11.474, 5.095), (-11.474, 6.195))
            ThreePointArc((-11.474, 6.195), (-11.174, 6.495), (-10.874, 6.195))
        make_face(mode=Mode.SUBTRACT)
    extrude(amount=-EXTRUDE_1_DEPTH)


solid = part.part
